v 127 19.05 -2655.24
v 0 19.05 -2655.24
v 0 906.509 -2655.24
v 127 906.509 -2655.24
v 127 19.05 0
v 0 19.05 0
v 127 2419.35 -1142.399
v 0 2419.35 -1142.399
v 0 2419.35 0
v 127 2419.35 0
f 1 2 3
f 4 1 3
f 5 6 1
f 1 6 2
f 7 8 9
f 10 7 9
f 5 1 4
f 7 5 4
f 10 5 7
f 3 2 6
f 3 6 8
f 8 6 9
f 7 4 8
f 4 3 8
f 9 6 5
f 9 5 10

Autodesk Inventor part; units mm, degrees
ref_plane "YZ Plane" through (0, 0, 0) normal (1, 0, 0) x (0, 1, 0)
ref_plane "XZ Plane" through (0, 0, 0) normal (0, 1, 0) x (-1, 0, 0)
ref_plane "XY Plane" through (0, 0, 0) normal (0, 0, 1) x (1, 0, 0)
sketch "Sketch1" plane through (0, 0, 0) normal (1, 0, 0) x (0, 1, 0)
  line L0 (0, 0) -> (2438.4, 0)
  line L1 (2438.4, 0) -> (2438.4, -1150.2898)
  line L2 (2438.4, -1150.2898) -> (914.4, -2674.2898)
  line L3 (914.4, -2674.2898) -> (0, -2674.2898)
  line L4 (0, -2674.2898) -> (0, 0)
  line L5 (2419.35, -1142.399) -> (2419.35, 0)
  line L6 (19.05, 0) -> (19.05, -2655.2398)
  line L7 (19.05, -2655.2398) -> (906.5092, -2655.2398)
  line L8 (906.5092, -2655.2398) -> (2419.35, -1142.399)
  dimension "d0" = 2674.2898
  dimension "d1" = 2438.4
  dimension "d2" = 914.4
  dimension "d3" = 135
  dimension "d6" = 19.05
  dimension "d7" = 19.05
  dimension "d8" = 19.05
extrude "Extrusion1" add sketch "Sketch1" along normal blind 127 contours L0 L5 L8 L7 L6
properties part number "Wall_Between_Attic_Room_And_Stairwell" material "Wood (Southern Pine)"
